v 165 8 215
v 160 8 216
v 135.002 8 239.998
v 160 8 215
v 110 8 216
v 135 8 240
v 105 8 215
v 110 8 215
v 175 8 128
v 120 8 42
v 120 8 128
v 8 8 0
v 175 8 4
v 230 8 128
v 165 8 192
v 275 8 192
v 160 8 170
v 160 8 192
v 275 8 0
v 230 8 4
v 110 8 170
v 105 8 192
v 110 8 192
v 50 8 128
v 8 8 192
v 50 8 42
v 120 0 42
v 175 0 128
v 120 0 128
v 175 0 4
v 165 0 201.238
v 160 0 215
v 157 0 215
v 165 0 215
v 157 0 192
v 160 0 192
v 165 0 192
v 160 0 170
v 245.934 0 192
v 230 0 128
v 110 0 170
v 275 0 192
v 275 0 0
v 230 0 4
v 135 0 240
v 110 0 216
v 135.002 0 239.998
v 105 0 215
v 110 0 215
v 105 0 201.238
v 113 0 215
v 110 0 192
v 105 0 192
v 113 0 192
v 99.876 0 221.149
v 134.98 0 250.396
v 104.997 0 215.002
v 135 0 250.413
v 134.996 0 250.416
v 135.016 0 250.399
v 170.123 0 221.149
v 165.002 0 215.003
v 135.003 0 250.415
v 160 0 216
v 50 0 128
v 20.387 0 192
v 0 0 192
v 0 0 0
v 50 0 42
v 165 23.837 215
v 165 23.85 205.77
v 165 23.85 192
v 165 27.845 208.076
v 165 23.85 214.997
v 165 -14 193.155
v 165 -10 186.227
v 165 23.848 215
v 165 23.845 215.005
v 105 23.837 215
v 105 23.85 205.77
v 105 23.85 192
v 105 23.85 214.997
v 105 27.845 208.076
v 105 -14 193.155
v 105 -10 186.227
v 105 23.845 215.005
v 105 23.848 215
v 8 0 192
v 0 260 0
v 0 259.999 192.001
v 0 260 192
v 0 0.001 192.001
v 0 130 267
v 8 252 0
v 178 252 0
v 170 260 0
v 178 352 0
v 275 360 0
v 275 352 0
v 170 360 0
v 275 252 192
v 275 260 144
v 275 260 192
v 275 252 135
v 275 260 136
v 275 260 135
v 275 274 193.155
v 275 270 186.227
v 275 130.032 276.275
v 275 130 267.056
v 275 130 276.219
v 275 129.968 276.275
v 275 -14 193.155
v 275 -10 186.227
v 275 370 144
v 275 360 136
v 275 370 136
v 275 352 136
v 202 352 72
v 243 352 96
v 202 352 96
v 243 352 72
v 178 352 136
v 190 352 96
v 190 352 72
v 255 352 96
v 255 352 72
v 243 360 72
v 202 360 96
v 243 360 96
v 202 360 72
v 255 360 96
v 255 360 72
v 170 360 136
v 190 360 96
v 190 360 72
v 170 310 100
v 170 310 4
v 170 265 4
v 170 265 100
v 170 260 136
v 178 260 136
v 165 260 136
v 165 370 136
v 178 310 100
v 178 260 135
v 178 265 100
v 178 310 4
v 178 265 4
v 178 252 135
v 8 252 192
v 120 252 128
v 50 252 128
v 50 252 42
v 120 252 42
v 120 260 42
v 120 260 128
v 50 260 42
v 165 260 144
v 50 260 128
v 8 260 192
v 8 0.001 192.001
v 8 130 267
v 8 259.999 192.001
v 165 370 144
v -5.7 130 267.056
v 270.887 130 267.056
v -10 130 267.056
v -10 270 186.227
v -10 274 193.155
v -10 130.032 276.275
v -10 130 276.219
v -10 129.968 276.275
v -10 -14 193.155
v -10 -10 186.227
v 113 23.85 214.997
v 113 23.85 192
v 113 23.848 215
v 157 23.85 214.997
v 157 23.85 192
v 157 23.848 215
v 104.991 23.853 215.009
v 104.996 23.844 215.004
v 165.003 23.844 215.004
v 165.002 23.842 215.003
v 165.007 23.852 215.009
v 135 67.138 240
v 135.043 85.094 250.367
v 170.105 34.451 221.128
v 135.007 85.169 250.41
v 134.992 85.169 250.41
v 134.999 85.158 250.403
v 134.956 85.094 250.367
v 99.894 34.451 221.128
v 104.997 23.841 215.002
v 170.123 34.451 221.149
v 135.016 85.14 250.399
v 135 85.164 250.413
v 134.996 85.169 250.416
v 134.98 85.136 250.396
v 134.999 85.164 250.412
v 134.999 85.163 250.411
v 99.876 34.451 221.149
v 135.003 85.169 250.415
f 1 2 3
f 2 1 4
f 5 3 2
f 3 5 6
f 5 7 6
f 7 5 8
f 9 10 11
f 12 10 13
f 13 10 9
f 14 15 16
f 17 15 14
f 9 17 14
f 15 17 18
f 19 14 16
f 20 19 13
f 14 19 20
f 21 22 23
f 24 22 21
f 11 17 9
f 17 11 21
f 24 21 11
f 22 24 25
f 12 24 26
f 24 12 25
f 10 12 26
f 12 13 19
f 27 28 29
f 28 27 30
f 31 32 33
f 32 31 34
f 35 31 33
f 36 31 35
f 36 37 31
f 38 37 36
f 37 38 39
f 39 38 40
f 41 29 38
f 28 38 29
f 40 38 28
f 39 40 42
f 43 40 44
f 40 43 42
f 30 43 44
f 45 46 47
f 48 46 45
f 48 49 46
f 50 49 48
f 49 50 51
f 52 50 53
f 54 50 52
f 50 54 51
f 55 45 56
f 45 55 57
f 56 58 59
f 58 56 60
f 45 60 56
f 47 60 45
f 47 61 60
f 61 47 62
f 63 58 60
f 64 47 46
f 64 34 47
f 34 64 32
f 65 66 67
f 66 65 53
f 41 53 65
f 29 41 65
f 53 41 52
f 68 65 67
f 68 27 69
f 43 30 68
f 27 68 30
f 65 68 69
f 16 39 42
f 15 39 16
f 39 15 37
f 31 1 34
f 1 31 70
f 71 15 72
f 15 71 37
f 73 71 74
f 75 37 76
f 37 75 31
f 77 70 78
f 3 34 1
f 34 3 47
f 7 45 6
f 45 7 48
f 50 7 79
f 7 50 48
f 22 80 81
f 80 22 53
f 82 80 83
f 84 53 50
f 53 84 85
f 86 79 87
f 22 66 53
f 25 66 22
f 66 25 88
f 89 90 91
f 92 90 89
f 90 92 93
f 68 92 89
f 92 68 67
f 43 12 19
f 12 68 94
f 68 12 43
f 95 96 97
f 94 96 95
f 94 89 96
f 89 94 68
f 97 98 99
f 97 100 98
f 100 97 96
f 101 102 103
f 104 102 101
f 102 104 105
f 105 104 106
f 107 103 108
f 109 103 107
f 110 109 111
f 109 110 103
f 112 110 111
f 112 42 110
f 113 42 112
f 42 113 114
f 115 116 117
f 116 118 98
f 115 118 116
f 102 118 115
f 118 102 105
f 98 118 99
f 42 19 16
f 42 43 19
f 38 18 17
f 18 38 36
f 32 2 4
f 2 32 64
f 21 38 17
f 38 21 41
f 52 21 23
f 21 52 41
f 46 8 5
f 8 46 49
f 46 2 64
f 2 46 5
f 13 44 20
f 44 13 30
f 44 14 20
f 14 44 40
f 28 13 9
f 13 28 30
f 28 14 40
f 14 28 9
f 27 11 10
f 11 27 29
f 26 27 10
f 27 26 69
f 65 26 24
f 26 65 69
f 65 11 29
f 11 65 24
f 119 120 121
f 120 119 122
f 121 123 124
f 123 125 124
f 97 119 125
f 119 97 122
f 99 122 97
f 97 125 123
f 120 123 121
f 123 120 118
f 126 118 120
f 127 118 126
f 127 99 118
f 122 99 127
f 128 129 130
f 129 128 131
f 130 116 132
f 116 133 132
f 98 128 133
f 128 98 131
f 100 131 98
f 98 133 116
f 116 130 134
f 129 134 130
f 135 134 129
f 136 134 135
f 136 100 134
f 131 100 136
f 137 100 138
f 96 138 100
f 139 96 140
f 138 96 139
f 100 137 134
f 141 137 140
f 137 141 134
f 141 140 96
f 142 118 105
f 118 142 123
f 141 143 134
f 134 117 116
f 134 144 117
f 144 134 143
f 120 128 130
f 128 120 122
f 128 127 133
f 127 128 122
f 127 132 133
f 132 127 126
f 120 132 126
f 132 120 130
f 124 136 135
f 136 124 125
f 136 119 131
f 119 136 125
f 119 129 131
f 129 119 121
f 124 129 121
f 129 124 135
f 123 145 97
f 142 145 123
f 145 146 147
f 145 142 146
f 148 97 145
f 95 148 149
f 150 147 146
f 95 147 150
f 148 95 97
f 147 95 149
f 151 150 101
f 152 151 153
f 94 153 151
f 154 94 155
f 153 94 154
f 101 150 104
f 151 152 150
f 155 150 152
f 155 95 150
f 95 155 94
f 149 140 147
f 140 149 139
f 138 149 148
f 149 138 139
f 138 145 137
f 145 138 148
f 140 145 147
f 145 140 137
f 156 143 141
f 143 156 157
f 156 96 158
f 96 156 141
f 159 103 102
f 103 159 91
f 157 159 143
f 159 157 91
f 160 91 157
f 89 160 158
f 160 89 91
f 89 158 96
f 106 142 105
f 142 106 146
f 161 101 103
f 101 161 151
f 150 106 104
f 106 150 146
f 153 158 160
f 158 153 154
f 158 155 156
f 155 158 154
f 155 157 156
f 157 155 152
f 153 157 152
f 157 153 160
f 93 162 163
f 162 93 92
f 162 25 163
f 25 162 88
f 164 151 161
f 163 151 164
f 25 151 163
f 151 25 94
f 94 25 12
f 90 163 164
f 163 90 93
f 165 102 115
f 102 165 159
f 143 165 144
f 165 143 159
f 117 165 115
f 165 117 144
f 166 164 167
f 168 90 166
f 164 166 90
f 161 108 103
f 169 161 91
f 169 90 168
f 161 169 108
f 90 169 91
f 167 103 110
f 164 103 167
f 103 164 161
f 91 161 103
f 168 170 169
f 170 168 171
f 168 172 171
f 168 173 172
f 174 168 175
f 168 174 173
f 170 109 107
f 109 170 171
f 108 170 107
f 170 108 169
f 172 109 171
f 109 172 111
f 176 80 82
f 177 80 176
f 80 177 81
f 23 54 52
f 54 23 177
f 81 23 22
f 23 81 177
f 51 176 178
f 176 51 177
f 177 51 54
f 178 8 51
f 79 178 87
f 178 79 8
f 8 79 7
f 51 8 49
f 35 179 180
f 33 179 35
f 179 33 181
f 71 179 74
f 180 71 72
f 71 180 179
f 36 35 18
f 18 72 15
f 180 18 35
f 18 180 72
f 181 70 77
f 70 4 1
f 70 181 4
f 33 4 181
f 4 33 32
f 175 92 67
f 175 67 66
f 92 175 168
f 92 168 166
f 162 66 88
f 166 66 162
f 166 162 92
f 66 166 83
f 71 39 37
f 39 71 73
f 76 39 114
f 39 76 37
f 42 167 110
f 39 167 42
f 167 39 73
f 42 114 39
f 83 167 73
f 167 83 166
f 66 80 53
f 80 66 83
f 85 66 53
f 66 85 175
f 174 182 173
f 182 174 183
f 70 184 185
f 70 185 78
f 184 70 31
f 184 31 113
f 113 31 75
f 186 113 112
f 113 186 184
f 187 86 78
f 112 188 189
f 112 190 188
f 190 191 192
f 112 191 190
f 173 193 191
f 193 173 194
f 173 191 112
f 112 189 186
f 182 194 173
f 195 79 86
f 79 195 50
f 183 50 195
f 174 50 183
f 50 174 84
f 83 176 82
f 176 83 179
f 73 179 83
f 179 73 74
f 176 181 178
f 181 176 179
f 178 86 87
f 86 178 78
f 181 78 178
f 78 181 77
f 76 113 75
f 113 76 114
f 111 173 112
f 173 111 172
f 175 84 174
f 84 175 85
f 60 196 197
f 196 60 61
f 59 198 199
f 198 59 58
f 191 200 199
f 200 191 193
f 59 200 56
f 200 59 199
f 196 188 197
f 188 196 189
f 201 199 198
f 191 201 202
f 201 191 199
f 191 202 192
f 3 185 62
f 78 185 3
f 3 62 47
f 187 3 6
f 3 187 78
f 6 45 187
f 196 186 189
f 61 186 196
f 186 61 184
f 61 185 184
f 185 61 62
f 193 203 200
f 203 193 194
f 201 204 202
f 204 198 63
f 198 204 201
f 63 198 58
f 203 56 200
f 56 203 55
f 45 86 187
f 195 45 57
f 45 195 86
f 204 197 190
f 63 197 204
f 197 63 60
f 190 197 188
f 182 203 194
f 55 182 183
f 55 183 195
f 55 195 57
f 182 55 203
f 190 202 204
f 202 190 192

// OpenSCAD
// file: bergingdak.scad
/*
 * Blueprint: Dak berging
 * description: 
 */
module bergingdak()
{
	difference() {
		union() {
		color("black") { linear_extrude(height=8) { polygon( [ 
			[0, 0],
			[110, 0],
			[110, 110],
			[0, 110]
		] ); } } 

		} // union


	} // difference
} // END OF: Dak berging
// file: dakkapel_zijkant.scad
/*
 * Blueprint: Dakkapel zijkant
 * description: 
 */
module dakkapelzijkant()
{
	difference() {
		union() {
		color("royalblue") { linear_extrude(height=8) { polygon( [ 
			[0, 0],
			[23.85, 0],
			[23.85, 23],
			[0, 23]
		] ); } } 

		} // union


	} // difference
} // END OF: Dakkapel zijkant
// file: dakkapeldak.scad
/*
 * Blueprint: Dak achter
 * description: 
 */
module dakkapeldak()
{
	difference() {
		union() {
		color("black") { linear_extrude(height=8) { polygon( [ 
			[39.0512, 0],
			[39.0512, 34.4508],
			[-6.67, 85.1691],
			[-6.67, 0]
		] ); } } 

		} // union


	} // difference
} // END OF: Dak achter
// file: dakachter.scad
/*
 * Blueprint: Dak achter
 * description: 
 */
module dakachter()
{
	difference() {
		union() {
		color("black") { linear_extrude(height=8) { polygon( [ 
			[-10, 0],
			[275, 0],
			[275, 166.24],
			[-10, 166.24]
		] ); } } 

		} // union


	} // difference
} // END OF: Dak achter
// file: dakvoor.scad
/*
 * Blueprint: Dak voorkant
 * description: 
 */
module dakvoor()
{
	difference() {
		union() {
		color("black") { linear_extrude(height=8) { polygon( [ 
			[-10, 0],
			[105, 0],
			[105, 43.7],
			[165, 43.7],
			[165, 0],
			[275, 0],
			[275, 166.24],
			[-10, 166.24]
		] ); } } 

		} // union


	} // difference
} // END OF: Dak voorkant
// file: achterkant.scad
/*
 * Blueprint: Achterkant
 * description: 
 */
module achter()
{
	difference() {
		union() {
		color("royalblue") { linear_extrude(height=8) { polygon( [ 
			[225, 128],
			[229.308, 144],
			[150.692, 144],
			[155, 128]
		] ); } } 

		color("royalblue") { linear_extrude(height=3) { polygon( [ 
			[97, 0],
			[105, 0],
			[105, 136],
			[97, 136]
		] ); } } 

		color("royalblue") { linear_extrude(height=8) { polygon( [ 
			[155, 32],
			[225, 32],
			[225, 42],
			[155, 42]
		] ); } } 

		color("darkred") { linear_extrude(height=8) { polygon( [ 
			[97, 135],
			[97, 0],
			[275, 0],
			[275, 192],
			[0, 192],
			[0, 135]
		] ); } } 

		} // union
		color("white") { linear_extrude(height=8) { polygon( [ 
			[155, 42],
			[225, 42],
			[225, 128],
			[155, 128]
		] ); } } 

		color("royalblue") { linear_extrude(height=8) { polygon( [ 
			[159, 99],
			[221, 99],
			[221, 124],
			[159, 124]
		] ); } } 

		color("royalblue") { linear_extrude(height=8) { polygon( [ 
			[159, 47],
			[221, 47],
			[221, 94],
			[159, 94]
		] ); } } 



	} // difference
} // END OF: Achterkant
// file: bergingzijkant.scad
/*
 * Blueprint: Berging zijkant
 * description: 
 */
module berging_zijkant()
{
	difference() {
		union() {
		color("royalblue") { linear_extrude(height=8) { polygon( [ 
			[100, 0],
			[108, 0],
			[108, 136],
			[100, 136]
		] ); } } 

		color("darkred") { linear_extrude(height=8) { polygon( [ 
			[0, 0],
			[108, 0],
			[108, 136],
			[0, 136]
		] ); } } 

		} // union
		color("royalblue") { linear_extrude(height=8) { polygon( [ 
			[50, 4],
			[95, 4],
			[95, 100],
			[50, 100]
		] ); } } 



	} // difference
} // END OF: Berging zijkant
// file: bergingachterkant.scad
/*
 * Blueprint: Achterkant van de berging
 * description: 
 */
module bergingachter()
{
	difference() {
		union() {
		color("royalblue") { linear_extrude(height=8) { polygon( [ 
			[20, 96],
			[32, 96],
			[32, 104],
			[20, 104]
		] ); } } 

		color("royalblue") { linear_extrude(height=8) { polygon( [ 
			[73, 96],
			[85, 96],
			[85, 104],
			[73, 104]
		] ); } } 

		color("darkred") { linear_extrude(height=8) { polygon( [ 
			[0, 0],
			[105, 0],
			[105, 136],
			[0, 136]
		] ); } } 

		} // union
		color("royalblue") { linear_extrude(height=8) { polygon( [ 
			[20, 72],
			[32, 72],
			[32, 96],
			[20, 96]
		] ); } } 

		color("royalblue") { linear_extrude(height=8) { polygon( [ 
			[73, 72],
			[85, 72],
			[85, 96],
			[73, 96]
		] ); } } 



	} // difference
} // END OF: Achterkant van de berging
// file: grondoppervlak.scad
/*
 * Blueprint: Floor
 * description: 
 */
module oppervlak()
{
	difference() {
		union() {
		color("royalblue") { linear_extrude(height=3) { polygon( [ 
			[223, 260],
			[267, 260],
			[267, 352],
			[223, 352]
		] ); } } 

		color("royalblue") { linear_extrude(height=3) { polygon( [ 
			[178, 260],
			[218, 260],
			[218, 312],
			[178, 312]
		] ); } } 

		color("royalblue") { linear_extrude(height=3) { polygon( [ 
			[8, 133],
			[165, 133],
			[165, 252],
			[8, 252]
		] ); } } 

		color("royalblue") { linear_extrude(height=2) { polygon( [ 
			[0, 0],
			[275, 0],
			[275, 360],
			[170, 360],
			[170, 260],
			[0, 260]
		] ); } } 

		color("royalblue") { linear_extrude(height=3) { polygon( [ 
			[170, 8],
			[267, 8],
			[267, 128],
			[170, 128]
		] ); } } 

		color("royalblue") { linear_extrude(height=3) { polygon( [ 
			[170, 133],
			[267, 133],
			[267, 252],
			[170, 252]
		] ); } } 

		color("royalblue") { linear_extrude(height=3) { polygon( [ 
			[178, 317],
			[218, 317],
			[218, 352],
			[178, 352]
		] ); } } 

		color("royalblue") { linear_extrude(height=3) { polygon( [ 
			[8, 8],
			[165, 8],
			[165, 128],
			[8, 128]
		] ); } } 

		} // union


	} // difference
} // END OF: Floor
// file: zijkant_buiten.scad
/*
 * Blueprint: Zijkant buiten
 * description: 
 */
module buiten()
{
	difference() {
		union() {
		color("darkred") { linear_extrude(height=8) { polygon( [ 
			[260, 0],
			[260, 135],
			[260, 192],
			[130, 267],
			[0, 192],
			[0, 0]
		] ); } } 

		} // union


	} // difference
} // END OF: Zijkant buiten
// file: zijkant_binnen.scad
/*
 * Blueprint: Zijkant binnen
 * description: 
 */
module binnen()
{
	difference() {
		union() {
		} // union
		color("royalblue") { linear_extrude(height=8) { polygon( [ 
			[360, 0],
			[360, 136],
			[260, 136],
			[260, 192],
			[130, 267],
			[0, 192],
			[0, 0]
		] ); } } 



	} // difference
} // END OF: Zijkant binnen
// file: voorkant.scad
/*
 * Blueprint: Front
 * description: 
 */
module front()
{
	difference() {
		union() {
		color("royalblue") { linear_extrude(height=8) { polygon( [ 
			[110, 160],
			[160, 160],
			[160, 170],
			[110, 170]
		] ); } } 

		color("royalblue") { linear_extrude(height=8) { polygon( [ 
			[230, 128],
			[234, 144],
			[171, 144],
			[175, 128]
		] ); } } 

		color("royalblue") { linear_extrude(height=8) { polygon( [ 
			[120, 128],
			[124.308, 144],
			[45.6923, 144],
			[50, 128]
		] ); } } 

		color("royalblue") { linear_extrude(height=8) { polygon( [ 
			[50, 32],
			[120, 32],
			[120, 42],
			[50, 42]
		] ); } } 

		color("darkred") { linear_extrude(height=8) { polygon( [ 
			[0, 0],
			[275, 0],
			[275, 192],
			[165, 192],
			[165, 215],
			[135, 240],
			[105, 215],
			[105, 192],
			[0, 192]
		] ); } } 

		} // union
		color("royalblue") { linear_extrude(height=8) { polygon( [ 
			[110, 170],
			[160, 170],
			[160, 216],
			[110, 216]
		] ); } } 

		color("white") { linear_extrude(height=8) { polygon( [ 
			[114, 174],
			[156, 174],
			[156, 212],
			[114, 212]
		] ); } } 

		color("royalblue") { linear_extrude(height=8) { polygon( [ 
			[180, 4],
			[225, 4],
			[225, 94],
			[180, 94]
		] ); } } 

		color("royalblue") { linear_extrude(height=8) { polygon( [ 
			[175, 4],
			[230, 4],
			[230, 128],
			[175, 128]
		] ); } } 

		color("white") { linear_extrude(height=8) { polygon( [ 
			[180, 99],
			[225, 99],
			[225, 124],
			[180, 124]
		] ); } } 

		color("white") { linear_extrude(height=8) { polygon( [ 
			[50, 42],
			[120, 42],
			[120, 128],
			[50, 128]
		] ); } } 

		color("royalblue") { linear_extrude(height=8) { polygon( [ 
			[54, 99],
			[116, 99],
			[116, 124],
			[54, 124]
		] ); } } 

		color("royalblue") { linear_extrude(height=8) { polygon( [ 
			[54, 47],
			[116, 47],
			[116, 94],
			[54, 94]
		] ); } } 



	} // difference
} // END OF: Front
// main file
include <voorkant.scad>
include <zijkant_binnen.scad>
include <zijkant_buiten.scad>
include <grondoppervlak.scad>
include <bergingachterkant.scad>
include <bergingzijkant.scad>
include <achterkant.scad>
include <dakvoor.scad>
include <dakachter.scad>
include <dakkapeldak.scad>
include <dakkapel_zijkant.scad>
include <bergingdak.scad>

// translate([0,0,0]) oppervlak();

translate([0,8,0]) rotate([90,0,0]) front();
rotate([90,0,90]) buiten();
translate([275-8,0,0]) rotate([90,0,90]) binnen();
translate([275,360-8,0]) rotate([90,0,180]) bergingachter();
translate([170+8,360,0]) rotate([90,0,-90]) berging_zijkant();

translate([275,260-8,0]) rotate([90,0,180]) achter();

translate([165,260,136]) bergingdak();

translate([265,270,192-(10*tan(30))]) rotate([30,0,180]) dakachter();

translate([105,0,192]) rotate([90,0,90]) dakkapelzijkant();
translate([165-8,0,192]) rotate([90,0,90]) dakkapelzijkant();

translate([0,-10,192-(10*tan(30))]) rotate([30,0,0]) dakvoor();
translate([135, 0, 240]) rotate([0,39.8,0]) dakkapeldak();
translate([135-(8*sin(atan(25/30))), 0, 240+8*cos(atan(25/30))]) rotate([0,180-39.8,0]) dakkapeldak(); //
